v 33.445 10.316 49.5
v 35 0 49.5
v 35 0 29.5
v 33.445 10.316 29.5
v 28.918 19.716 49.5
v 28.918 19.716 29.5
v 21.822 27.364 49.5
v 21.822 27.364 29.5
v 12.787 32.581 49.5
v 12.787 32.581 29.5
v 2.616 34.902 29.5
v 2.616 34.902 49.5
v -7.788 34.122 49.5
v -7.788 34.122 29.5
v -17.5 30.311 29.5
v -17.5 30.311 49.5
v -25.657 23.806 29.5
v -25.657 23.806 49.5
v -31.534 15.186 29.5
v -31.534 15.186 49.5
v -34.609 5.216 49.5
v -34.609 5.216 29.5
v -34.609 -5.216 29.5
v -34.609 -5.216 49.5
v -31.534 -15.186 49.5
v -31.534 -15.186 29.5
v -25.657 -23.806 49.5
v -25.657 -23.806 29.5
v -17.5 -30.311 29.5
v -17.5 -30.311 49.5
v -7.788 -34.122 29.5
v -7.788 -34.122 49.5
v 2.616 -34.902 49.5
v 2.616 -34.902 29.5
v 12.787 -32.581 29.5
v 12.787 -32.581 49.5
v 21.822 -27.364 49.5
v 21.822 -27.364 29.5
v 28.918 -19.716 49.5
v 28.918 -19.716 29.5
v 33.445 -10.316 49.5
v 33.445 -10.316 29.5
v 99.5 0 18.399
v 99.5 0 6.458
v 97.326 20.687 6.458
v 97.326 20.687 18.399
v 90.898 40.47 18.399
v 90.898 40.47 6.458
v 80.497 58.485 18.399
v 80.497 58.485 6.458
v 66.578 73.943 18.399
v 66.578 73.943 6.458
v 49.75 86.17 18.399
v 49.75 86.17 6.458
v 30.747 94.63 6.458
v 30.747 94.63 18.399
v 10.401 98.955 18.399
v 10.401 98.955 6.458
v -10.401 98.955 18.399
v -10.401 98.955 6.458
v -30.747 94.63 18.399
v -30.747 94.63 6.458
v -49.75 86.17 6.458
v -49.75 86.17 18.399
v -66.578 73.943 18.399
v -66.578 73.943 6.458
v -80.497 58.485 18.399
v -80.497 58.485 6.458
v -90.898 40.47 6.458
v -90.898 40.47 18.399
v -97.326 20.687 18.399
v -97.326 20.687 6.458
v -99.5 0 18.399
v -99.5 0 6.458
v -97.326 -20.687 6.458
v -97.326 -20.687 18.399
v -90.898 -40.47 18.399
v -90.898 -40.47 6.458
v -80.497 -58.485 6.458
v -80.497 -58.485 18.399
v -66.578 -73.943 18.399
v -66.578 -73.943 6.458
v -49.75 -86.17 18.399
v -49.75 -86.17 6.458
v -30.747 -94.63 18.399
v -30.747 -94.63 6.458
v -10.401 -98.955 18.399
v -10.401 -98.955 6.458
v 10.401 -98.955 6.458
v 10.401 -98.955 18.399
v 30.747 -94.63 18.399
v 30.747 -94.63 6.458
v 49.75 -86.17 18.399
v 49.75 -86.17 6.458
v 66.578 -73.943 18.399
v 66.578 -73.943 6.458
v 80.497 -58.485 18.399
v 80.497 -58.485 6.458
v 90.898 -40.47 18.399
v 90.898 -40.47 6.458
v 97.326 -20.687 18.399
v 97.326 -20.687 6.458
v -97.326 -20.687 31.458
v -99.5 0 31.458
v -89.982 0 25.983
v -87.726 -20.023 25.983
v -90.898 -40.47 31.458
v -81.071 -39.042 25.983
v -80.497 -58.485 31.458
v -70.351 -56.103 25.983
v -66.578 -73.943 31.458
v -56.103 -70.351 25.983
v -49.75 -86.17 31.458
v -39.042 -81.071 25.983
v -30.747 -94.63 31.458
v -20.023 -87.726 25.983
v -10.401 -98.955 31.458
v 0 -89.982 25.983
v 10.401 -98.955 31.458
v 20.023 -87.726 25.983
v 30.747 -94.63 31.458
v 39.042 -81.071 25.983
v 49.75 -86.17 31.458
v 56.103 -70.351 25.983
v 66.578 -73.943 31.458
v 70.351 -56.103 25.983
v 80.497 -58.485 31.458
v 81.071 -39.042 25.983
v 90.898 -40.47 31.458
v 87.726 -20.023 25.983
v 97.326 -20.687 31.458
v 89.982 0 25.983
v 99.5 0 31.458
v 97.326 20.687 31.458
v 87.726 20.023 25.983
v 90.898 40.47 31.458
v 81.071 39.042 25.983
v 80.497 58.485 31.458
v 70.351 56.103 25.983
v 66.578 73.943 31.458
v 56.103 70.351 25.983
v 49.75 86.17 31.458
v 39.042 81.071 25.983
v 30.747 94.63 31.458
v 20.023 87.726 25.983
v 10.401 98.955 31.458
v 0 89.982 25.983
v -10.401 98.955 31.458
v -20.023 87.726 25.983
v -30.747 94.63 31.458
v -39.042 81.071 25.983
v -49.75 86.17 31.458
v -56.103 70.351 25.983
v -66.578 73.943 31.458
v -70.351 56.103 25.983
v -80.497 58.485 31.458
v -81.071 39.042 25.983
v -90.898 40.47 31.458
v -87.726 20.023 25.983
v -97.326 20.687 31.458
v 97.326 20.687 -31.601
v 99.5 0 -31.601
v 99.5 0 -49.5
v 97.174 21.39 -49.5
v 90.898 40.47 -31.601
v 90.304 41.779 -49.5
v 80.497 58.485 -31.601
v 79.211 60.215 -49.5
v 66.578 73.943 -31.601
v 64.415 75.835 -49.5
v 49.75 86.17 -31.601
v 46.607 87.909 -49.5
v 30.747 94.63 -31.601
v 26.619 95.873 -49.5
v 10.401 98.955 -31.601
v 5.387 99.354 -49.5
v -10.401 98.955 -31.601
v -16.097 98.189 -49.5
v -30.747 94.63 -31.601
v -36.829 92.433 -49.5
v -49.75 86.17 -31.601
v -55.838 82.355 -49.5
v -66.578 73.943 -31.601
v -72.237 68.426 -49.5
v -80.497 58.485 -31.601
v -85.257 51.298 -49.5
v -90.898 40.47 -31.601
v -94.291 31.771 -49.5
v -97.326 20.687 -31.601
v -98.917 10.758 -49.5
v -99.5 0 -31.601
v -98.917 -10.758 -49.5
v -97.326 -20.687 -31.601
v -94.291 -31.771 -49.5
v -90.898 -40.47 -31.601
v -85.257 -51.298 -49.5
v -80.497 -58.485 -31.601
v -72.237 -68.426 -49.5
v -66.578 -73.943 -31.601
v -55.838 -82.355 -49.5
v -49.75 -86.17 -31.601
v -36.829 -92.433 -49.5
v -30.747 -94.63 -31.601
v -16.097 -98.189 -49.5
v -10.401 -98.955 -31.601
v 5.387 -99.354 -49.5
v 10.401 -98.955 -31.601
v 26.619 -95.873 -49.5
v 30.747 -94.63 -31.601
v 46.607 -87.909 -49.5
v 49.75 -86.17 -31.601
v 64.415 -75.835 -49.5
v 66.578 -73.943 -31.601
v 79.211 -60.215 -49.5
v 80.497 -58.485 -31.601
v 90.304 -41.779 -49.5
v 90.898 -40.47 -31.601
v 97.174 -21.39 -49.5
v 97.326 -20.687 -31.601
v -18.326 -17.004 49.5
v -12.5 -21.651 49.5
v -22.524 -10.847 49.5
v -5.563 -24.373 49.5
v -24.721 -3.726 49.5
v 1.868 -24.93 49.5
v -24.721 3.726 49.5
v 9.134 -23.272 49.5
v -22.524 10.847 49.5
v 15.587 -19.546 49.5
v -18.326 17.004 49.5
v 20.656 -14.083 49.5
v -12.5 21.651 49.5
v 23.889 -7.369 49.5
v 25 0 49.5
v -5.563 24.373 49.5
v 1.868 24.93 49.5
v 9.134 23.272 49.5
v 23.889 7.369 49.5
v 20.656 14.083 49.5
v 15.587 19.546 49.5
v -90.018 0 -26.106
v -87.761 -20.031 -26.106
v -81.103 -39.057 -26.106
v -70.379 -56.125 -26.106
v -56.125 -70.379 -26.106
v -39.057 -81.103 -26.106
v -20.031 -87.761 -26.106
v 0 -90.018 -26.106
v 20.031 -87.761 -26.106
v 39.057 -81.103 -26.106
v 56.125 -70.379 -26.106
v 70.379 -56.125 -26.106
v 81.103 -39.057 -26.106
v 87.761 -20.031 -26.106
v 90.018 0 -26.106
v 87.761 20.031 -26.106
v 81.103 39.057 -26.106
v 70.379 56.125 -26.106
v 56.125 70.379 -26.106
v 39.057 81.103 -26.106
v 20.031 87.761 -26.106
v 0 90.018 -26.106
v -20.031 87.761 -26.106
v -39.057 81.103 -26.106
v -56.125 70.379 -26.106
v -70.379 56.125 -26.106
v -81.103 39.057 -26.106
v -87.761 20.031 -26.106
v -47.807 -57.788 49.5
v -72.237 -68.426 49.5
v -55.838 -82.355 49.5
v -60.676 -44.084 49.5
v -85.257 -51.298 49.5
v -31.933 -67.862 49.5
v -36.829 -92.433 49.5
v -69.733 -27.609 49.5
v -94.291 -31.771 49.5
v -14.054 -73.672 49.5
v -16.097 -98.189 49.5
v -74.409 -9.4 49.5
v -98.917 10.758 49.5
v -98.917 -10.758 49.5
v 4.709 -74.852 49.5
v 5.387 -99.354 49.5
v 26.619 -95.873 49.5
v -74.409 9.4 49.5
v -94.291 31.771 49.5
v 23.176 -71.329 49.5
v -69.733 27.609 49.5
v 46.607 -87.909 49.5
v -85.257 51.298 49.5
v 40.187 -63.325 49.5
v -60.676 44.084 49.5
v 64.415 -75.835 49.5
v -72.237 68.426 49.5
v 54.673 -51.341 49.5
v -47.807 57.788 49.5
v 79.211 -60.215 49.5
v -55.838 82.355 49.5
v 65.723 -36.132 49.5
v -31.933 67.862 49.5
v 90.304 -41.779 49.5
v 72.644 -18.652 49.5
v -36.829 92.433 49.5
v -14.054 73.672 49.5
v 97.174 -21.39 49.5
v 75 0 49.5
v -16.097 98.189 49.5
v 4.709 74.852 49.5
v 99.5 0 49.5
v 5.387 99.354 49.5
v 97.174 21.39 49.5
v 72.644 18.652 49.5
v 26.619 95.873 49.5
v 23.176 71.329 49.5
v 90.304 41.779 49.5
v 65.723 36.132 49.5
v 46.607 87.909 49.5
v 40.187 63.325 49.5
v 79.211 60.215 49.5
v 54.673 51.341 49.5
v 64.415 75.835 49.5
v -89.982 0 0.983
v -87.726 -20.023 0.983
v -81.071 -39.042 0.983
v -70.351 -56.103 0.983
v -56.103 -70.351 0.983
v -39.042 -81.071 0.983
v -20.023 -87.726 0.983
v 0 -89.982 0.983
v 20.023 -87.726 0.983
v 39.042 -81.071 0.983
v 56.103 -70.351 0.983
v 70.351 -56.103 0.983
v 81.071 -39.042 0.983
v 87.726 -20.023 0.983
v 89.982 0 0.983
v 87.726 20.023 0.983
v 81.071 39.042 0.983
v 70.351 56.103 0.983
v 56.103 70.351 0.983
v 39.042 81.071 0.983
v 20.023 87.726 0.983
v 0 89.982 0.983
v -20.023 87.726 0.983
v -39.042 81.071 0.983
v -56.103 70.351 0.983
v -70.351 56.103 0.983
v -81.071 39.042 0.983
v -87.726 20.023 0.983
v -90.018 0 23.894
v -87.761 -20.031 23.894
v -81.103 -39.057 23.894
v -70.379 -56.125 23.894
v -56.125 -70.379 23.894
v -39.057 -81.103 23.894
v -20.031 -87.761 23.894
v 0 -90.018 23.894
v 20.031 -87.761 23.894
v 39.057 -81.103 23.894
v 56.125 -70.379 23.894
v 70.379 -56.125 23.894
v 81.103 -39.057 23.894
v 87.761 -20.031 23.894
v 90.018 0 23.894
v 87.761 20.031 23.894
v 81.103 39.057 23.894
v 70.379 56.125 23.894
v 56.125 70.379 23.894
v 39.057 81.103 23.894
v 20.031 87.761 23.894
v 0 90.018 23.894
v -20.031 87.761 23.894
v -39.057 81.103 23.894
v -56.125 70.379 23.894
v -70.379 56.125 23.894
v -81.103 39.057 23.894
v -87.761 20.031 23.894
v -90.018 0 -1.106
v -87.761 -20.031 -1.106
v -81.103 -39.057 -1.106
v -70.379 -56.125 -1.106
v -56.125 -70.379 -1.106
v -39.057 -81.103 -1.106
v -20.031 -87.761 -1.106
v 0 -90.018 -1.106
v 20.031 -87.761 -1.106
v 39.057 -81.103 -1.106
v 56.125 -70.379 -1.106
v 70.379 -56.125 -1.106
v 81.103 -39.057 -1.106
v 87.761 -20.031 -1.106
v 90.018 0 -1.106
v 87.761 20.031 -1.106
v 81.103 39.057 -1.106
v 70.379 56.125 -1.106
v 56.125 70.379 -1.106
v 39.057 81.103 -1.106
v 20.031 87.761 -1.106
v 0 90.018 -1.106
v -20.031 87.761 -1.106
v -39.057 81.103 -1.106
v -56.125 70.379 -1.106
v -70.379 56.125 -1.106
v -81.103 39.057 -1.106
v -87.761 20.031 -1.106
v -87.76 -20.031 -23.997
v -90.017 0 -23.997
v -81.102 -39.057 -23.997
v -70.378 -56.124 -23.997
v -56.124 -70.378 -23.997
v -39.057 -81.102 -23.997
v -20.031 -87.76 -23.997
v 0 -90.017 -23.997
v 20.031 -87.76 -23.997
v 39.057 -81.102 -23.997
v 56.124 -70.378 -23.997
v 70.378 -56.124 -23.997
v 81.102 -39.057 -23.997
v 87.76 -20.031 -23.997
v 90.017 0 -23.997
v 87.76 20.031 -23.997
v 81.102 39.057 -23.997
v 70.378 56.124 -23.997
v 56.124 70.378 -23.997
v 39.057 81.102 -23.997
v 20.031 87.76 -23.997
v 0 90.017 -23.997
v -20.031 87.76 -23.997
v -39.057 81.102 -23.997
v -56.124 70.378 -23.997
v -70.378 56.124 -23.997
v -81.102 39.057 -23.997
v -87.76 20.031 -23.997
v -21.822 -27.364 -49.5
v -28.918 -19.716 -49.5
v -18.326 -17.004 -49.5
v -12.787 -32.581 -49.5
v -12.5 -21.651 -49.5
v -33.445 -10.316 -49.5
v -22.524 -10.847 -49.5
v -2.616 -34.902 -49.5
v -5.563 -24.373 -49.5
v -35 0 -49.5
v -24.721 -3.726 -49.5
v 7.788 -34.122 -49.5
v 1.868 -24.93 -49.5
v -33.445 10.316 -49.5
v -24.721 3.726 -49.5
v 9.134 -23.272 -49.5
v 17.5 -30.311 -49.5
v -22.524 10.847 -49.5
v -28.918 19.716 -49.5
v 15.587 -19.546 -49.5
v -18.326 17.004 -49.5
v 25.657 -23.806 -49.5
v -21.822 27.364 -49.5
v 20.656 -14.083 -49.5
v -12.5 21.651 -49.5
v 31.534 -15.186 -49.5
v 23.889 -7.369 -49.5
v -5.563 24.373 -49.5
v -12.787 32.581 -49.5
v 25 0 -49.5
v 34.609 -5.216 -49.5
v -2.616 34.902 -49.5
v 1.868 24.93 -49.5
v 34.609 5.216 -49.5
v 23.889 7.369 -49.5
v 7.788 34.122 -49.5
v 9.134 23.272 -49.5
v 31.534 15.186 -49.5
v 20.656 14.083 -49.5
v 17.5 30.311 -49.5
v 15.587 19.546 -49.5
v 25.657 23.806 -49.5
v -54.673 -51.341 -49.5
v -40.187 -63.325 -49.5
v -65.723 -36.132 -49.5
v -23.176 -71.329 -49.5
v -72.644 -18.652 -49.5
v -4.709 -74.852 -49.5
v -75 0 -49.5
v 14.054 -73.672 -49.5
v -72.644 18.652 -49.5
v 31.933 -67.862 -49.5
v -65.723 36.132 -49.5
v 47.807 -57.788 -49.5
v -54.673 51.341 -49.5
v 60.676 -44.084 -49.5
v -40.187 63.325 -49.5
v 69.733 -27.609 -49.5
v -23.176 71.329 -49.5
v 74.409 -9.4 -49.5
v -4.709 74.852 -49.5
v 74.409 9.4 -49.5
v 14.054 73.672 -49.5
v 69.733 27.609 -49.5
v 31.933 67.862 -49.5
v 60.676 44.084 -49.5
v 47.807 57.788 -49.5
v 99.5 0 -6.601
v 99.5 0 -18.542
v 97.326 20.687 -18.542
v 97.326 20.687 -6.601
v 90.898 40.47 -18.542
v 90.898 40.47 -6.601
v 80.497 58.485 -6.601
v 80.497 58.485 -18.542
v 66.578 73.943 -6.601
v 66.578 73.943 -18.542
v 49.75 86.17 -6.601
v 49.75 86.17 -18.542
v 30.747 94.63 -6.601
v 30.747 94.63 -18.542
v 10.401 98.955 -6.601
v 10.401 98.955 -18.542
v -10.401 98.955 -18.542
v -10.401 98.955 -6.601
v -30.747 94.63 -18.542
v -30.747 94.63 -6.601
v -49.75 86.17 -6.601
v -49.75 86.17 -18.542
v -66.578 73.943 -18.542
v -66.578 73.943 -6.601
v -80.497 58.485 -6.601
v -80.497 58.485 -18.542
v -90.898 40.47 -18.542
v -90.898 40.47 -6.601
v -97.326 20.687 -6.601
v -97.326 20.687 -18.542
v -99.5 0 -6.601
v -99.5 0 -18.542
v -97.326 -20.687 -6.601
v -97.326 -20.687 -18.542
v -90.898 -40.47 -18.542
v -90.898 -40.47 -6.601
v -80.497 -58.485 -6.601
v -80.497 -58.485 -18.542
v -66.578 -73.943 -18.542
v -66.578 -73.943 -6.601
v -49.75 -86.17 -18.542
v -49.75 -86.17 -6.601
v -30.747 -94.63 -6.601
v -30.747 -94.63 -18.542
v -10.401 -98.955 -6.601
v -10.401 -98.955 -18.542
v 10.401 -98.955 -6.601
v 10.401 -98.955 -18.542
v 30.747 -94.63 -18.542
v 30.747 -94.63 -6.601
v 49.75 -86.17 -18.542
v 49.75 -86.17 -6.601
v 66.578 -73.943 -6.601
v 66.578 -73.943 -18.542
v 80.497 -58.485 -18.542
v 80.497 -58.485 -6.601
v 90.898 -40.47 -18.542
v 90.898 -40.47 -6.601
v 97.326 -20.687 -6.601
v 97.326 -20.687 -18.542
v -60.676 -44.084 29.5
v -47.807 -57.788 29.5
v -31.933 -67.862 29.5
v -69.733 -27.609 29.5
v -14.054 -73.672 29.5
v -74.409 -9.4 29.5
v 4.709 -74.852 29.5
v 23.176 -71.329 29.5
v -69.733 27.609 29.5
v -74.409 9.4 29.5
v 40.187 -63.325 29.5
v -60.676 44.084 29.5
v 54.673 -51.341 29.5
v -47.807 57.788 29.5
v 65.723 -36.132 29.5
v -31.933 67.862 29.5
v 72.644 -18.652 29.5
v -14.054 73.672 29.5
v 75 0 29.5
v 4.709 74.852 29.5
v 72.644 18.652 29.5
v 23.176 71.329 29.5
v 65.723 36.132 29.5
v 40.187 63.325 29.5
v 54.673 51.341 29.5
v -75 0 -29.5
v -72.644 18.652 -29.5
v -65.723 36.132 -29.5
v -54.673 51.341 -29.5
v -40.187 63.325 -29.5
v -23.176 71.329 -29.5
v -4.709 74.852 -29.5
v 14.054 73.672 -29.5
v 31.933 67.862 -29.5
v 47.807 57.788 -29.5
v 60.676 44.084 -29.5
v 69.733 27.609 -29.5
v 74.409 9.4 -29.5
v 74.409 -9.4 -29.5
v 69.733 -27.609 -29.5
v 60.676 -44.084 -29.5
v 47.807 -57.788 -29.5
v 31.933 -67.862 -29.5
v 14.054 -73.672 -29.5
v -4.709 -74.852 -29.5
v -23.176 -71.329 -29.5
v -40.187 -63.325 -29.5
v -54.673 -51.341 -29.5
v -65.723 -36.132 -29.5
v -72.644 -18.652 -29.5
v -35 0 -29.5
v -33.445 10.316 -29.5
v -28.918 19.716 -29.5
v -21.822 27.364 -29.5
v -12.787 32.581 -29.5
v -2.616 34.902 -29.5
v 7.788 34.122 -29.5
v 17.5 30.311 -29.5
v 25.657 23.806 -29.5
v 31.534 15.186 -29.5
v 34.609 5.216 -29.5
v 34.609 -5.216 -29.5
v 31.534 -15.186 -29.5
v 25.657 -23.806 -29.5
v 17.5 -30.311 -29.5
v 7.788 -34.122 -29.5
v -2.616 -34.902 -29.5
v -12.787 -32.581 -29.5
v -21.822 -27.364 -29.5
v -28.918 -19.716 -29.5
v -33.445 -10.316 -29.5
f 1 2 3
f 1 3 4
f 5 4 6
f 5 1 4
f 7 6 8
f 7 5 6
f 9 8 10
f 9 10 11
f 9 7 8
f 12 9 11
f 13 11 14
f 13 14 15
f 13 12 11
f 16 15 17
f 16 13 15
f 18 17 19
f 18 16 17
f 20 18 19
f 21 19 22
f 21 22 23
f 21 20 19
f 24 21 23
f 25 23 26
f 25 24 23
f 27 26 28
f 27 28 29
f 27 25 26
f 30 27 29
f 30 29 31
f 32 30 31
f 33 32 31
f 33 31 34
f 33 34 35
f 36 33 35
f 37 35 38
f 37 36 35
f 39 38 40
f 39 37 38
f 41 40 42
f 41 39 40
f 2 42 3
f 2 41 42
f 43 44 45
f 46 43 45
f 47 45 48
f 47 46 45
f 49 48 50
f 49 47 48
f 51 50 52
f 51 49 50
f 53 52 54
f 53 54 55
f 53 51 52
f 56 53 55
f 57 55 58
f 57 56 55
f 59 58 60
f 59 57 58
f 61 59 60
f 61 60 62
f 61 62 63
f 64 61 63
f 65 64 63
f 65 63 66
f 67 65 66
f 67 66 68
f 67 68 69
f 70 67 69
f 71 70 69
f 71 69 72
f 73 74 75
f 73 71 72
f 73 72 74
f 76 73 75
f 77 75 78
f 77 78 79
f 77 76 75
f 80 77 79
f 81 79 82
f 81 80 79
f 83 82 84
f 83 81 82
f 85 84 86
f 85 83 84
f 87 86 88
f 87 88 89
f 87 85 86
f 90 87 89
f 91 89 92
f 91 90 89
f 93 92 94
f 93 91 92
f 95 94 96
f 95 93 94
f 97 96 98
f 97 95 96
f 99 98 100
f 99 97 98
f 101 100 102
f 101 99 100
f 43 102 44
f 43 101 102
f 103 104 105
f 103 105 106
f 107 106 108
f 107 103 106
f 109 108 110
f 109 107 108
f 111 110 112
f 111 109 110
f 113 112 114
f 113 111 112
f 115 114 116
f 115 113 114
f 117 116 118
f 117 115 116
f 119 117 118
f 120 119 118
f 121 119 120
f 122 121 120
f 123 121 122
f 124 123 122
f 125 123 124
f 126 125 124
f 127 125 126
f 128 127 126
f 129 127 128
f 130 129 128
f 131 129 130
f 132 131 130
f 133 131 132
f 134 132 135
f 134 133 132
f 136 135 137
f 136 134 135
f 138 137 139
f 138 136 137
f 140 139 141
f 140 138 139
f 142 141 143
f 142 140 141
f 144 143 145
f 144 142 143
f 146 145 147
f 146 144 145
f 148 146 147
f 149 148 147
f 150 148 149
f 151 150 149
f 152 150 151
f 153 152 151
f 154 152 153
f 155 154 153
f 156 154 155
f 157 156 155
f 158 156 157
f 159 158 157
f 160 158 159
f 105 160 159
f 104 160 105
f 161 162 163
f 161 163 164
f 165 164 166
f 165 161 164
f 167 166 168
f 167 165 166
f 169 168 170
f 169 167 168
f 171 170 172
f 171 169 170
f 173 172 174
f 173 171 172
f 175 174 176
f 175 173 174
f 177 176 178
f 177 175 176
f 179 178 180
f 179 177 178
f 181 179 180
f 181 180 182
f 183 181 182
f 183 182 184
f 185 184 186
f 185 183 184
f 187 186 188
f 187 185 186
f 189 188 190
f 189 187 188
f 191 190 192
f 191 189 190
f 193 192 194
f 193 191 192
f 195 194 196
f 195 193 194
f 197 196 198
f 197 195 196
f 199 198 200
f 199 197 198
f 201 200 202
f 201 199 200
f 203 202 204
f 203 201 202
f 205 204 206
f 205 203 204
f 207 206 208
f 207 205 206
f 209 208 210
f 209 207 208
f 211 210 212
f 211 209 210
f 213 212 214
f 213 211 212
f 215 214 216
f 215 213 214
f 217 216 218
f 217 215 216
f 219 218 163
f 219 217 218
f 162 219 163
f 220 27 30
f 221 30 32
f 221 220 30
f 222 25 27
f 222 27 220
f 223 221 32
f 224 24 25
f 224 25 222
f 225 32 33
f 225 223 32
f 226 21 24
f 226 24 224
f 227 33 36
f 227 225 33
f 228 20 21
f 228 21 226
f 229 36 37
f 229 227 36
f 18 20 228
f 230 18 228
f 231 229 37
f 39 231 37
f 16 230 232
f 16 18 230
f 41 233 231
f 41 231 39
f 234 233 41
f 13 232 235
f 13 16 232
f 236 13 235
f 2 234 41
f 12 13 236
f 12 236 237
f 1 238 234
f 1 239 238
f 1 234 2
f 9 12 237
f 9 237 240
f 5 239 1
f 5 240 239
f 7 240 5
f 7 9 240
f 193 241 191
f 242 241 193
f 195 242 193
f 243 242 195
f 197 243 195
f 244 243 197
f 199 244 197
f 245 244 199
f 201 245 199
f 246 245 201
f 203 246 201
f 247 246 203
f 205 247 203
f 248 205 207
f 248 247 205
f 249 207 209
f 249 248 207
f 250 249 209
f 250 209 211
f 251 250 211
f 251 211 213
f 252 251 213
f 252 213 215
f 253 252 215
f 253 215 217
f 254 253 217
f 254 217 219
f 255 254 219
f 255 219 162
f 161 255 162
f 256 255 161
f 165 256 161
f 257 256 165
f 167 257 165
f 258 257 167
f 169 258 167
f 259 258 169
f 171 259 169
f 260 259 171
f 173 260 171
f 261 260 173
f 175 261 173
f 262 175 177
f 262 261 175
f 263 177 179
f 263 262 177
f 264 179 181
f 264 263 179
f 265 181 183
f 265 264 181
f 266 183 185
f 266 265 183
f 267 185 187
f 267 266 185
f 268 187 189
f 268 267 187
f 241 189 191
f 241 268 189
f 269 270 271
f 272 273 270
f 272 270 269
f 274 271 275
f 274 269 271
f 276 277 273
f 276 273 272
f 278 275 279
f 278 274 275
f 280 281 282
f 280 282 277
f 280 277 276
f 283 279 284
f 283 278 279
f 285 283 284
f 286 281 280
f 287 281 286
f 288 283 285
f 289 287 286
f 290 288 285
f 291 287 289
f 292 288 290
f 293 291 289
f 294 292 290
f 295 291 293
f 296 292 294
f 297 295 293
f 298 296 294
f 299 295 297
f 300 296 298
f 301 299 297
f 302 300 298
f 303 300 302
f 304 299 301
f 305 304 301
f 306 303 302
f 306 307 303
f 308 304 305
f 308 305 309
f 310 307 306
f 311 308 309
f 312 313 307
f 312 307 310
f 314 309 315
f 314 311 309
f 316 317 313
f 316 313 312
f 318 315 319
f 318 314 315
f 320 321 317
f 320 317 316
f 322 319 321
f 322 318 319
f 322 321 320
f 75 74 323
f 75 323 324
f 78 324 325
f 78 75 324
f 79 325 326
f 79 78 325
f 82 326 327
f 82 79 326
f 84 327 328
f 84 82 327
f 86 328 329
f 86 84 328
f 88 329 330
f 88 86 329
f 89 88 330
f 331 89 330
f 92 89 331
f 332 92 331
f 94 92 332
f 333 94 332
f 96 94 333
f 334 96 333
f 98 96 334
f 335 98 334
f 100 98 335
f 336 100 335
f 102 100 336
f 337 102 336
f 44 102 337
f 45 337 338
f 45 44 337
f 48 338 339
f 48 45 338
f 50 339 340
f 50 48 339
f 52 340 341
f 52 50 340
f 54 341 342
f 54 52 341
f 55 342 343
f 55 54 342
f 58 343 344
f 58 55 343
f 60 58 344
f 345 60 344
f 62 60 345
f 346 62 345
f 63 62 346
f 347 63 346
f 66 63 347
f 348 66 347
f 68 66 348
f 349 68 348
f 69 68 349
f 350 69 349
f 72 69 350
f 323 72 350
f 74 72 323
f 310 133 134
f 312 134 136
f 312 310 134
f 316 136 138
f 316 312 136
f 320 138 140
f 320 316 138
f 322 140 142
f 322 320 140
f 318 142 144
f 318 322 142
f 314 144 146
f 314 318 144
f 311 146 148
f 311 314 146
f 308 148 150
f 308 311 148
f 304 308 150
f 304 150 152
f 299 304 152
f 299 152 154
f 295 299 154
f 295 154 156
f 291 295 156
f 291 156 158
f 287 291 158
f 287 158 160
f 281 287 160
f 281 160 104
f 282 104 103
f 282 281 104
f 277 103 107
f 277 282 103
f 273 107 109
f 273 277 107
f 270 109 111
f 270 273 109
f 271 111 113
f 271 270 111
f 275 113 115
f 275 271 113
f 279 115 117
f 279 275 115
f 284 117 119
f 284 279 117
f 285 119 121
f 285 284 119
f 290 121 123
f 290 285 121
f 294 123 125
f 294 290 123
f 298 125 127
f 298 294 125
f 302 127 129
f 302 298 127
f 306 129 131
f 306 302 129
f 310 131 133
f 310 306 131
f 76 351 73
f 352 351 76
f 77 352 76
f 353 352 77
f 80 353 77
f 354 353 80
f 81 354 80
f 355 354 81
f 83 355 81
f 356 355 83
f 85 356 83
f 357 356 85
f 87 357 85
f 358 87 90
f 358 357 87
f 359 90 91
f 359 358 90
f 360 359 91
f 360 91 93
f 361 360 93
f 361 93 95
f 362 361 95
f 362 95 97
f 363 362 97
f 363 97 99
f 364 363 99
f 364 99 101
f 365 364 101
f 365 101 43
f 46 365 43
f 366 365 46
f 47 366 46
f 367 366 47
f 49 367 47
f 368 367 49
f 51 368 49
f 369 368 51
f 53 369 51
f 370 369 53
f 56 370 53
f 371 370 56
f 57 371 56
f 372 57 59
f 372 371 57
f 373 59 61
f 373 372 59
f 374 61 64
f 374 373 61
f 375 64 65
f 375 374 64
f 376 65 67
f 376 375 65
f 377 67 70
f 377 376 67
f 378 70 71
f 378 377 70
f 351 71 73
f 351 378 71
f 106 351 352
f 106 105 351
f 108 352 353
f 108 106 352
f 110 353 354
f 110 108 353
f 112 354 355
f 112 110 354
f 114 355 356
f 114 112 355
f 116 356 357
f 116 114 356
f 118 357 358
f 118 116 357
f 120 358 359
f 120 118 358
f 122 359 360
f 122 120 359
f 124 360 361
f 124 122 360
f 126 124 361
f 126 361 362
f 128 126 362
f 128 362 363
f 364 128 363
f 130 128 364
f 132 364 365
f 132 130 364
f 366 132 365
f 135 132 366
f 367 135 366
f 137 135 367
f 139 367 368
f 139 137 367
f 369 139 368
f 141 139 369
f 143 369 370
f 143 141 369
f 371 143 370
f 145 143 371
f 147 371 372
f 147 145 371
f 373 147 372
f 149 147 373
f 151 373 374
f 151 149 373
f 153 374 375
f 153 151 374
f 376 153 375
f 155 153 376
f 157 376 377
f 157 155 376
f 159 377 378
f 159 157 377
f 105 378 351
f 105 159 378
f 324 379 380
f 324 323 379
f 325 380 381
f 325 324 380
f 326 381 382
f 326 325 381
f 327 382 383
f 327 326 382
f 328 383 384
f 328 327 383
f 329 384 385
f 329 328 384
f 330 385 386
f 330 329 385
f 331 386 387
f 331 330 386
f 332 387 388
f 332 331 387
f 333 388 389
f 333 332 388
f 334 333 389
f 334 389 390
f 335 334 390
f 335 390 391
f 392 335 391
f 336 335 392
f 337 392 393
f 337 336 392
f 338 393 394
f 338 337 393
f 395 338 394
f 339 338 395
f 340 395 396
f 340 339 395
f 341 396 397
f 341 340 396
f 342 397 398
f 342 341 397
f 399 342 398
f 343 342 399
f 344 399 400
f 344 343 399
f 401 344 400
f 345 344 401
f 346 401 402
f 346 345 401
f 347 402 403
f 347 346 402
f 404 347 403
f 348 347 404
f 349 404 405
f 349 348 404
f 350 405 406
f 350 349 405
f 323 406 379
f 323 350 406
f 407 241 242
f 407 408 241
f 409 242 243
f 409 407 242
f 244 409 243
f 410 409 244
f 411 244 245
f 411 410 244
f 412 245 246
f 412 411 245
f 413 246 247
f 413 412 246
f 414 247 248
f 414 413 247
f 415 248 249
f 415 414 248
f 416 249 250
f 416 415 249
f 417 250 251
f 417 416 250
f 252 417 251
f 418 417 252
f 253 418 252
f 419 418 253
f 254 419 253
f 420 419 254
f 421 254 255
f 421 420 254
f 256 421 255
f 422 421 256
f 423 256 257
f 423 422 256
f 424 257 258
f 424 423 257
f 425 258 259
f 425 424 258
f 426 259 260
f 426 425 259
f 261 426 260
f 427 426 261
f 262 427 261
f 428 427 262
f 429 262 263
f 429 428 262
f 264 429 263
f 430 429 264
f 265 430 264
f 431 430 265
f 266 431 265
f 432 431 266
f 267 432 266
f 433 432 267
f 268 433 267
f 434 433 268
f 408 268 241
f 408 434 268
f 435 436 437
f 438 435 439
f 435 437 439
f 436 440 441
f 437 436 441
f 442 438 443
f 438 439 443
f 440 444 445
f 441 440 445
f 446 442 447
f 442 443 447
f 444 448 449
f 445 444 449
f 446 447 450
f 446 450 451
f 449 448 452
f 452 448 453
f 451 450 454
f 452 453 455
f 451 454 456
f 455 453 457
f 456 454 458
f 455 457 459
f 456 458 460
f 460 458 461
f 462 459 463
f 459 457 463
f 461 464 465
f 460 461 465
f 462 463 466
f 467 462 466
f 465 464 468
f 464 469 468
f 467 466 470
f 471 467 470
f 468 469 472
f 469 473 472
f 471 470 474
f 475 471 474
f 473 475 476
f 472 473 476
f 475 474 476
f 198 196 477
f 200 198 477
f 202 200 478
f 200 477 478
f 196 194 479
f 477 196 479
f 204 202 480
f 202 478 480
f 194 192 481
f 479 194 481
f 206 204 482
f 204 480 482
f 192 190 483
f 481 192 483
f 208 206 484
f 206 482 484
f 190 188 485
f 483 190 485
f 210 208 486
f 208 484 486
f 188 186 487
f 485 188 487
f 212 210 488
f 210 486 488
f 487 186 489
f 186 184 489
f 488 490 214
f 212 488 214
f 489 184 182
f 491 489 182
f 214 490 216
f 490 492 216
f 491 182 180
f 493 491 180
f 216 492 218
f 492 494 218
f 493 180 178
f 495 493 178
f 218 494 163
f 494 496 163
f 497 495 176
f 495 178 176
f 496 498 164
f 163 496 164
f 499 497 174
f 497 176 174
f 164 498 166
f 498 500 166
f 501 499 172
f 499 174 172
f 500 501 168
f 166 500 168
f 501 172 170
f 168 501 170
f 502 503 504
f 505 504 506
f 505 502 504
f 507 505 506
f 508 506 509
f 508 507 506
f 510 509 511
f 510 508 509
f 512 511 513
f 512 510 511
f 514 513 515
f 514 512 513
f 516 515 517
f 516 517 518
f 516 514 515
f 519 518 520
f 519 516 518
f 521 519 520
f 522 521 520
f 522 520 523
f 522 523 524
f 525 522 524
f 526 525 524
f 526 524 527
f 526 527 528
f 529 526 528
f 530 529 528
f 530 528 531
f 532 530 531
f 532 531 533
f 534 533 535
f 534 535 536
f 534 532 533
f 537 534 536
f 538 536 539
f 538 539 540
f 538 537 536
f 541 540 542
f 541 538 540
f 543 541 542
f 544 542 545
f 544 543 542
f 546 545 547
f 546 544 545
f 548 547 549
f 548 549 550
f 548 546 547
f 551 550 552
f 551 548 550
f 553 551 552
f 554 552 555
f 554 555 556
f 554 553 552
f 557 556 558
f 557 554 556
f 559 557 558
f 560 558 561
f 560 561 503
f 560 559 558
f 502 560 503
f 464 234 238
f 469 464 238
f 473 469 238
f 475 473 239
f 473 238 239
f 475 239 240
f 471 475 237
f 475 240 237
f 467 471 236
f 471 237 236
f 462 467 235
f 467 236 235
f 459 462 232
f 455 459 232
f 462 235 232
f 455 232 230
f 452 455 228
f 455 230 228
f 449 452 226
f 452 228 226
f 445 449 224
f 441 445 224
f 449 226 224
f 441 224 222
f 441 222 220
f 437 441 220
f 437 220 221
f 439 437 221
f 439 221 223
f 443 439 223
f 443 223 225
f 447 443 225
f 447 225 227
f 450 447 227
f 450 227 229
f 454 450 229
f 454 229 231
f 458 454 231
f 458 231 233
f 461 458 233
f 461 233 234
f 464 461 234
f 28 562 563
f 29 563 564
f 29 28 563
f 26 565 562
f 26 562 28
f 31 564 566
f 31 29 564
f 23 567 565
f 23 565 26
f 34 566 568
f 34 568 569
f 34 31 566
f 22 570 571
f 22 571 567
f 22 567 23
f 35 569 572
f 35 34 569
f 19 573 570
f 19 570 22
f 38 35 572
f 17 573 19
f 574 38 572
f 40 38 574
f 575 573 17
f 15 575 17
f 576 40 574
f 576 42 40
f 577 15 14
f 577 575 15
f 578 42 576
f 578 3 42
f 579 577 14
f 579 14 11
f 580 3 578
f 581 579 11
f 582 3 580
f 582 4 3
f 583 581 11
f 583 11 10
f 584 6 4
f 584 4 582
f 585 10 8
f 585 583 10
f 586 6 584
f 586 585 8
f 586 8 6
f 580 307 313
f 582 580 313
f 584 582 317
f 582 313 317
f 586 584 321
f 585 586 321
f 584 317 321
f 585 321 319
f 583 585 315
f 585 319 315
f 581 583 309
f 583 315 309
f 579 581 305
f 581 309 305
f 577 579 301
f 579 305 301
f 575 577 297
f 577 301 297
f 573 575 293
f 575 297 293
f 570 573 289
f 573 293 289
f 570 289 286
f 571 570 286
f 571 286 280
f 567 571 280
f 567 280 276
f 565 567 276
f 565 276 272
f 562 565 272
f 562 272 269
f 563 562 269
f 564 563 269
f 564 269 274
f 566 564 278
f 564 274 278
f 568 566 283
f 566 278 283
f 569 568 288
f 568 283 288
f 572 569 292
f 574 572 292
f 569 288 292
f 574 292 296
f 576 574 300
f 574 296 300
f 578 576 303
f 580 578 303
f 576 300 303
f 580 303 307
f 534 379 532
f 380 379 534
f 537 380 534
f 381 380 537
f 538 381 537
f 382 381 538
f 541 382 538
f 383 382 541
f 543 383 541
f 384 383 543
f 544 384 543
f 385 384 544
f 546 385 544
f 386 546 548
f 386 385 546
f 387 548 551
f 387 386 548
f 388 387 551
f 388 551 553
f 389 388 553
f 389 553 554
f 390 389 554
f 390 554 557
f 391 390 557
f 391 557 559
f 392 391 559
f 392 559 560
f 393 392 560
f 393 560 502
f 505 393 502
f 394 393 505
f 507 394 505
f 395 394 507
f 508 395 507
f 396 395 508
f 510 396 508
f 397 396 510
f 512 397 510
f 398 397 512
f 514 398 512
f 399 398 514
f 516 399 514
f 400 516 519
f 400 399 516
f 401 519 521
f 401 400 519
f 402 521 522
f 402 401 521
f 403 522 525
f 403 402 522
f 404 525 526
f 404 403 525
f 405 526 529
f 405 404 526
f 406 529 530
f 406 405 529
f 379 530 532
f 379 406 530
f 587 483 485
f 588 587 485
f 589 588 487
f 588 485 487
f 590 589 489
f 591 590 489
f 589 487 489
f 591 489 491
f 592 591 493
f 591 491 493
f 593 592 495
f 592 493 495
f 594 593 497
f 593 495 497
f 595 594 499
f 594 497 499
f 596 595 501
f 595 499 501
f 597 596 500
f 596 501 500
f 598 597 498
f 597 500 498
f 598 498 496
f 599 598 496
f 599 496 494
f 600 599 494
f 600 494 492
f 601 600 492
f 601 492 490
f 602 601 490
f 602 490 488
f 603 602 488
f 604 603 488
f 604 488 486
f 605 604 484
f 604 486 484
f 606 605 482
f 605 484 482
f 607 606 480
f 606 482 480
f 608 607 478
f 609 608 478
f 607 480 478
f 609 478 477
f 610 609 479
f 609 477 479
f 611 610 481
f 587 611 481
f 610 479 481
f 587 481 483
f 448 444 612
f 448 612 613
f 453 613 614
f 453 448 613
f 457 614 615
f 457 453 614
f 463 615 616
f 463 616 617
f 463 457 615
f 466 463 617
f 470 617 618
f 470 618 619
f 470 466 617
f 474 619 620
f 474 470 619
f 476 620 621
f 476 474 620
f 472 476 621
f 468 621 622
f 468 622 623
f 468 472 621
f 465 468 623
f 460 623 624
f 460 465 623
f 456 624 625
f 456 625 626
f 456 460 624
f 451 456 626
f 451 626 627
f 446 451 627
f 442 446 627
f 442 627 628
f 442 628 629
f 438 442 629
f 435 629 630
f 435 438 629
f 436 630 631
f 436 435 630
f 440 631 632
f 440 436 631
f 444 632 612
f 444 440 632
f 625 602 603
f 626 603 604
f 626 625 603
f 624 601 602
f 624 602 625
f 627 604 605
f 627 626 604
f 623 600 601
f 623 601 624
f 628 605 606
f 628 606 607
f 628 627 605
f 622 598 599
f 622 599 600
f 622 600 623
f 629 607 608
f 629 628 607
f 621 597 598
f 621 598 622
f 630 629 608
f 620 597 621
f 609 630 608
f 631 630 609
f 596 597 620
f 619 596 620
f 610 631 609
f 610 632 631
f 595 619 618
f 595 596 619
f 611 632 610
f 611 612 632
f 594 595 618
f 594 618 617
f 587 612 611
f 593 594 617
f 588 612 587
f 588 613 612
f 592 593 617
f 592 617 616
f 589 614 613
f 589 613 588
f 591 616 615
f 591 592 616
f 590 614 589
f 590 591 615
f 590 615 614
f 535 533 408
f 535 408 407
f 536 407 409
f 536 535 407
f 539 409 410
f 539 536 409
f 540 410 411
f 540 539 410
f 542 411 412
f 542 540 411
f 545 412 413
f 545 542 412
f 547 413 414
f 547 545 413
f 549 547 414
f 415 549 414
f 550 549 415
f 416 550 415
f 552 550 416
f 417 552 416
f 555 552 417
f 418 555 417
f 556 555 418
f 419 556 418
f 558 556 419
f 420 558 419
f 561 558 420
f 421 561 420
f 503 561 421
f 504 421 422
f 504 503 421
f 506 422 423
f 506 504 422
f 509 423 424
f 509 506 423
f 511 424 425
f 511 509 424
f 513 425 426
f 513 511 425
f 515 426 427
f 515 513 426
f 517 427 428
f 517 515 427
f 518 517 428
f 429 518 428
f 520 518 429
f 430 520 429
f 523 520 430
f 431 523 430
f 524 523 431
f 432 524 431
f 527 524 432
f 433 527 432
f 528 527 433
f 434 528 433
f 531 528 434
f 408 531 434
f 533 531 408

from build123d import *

# Parameters (mm, degrees)
SKETCH1_R               = 99.5
BOSS_EXTRUDE1_DEPTH     = 49.5
SKETCH3_R               = 75
SKETCH3_R_2             = 35
CUT_EXTRUDE1_DEPTH      = 20
SKETCH4_R               = 25
CUT_EXTRUDE2_DEPTH      = 1.0000001
CUT_EXTRUDE2_DEPTH_BACK = 100.0000001
SKETCH5_R               = 75
SKETCH5_R_2             = 35
CUT_EXTRUDE3_DEPTH      = 20


with BuildPart() as part:
    # Sketch1 → Boss-Extrude1 (new body, symmetric)
    with BuildSketch(Plane.XY):
        Circle(SKETCH1_R)
    extrude(amount=BOSS_EXTRUDE1_DEPTH, both=True)

    # Sketch2 → Cut-Revolve1 (revolve, cut)
    with BuildSketch(Plane(origin=(0, 0, 0), x_dir=(1, 0, 0), z_dir=(0, 1, 0))):
        Polygon((-89.981945933, -25.982850646), (-99.911722122, -31.694962561), (-99.915568006, -18.158689934), (-90.018054068, -23.893839429), align=None)
        Polygon((-89.981945933, -0.982850646), (-99.911722122, -6.694962562), (-99.92977619, 6.849543049), (-90.018054068, 1.106160571), align=None)
        Polygon((-90.016592149, 23.99721909), (-99.911722122, 18.305037438), (-99.92977619, 31.849543049), (-90.018054068, 26.106160571), align=None)
    revolve(axis=Axis((0, 0, 0), (0, 0, 1)), mode=Mode.SUBTRACT)

    # Sketch3 → Cut-Extrude1 (cut)
    with BuildSketch(Plane(origin=(0, 0, -49.5), x_dir=(-1, 0, 0), z_dir=(0, 0, -1))):
        Circle(SKETCH3_R)
        Circle(SKETCH3_R_2, mode=Mode.SUBTRACT)
    extrude(amount=-CUT_EXTRUDE1_DEPTH, mode=Mode.SUBTRACT)

    # Sketch4 → Cut-Extrude2 (cut, two sides)
    with BuildSketch(Plane.XY.offset(49.5)) as cut_extrude2_sk:
        Circle(SKETCH4_R)
    extrude(amount=CUT_EXTRUDE2_DEPTH, mode=Mode.SUBTRACT)
    extrude(cut_extrude2_sk.sketch, amount=-CUT_EXTRUDE2_DEPTH_BACK, mode=Mode.SUBTRACT)

    # Sketch5 → Cut-Extrude3 (cut)
    with BuildSketch(Plane.XY.offset(49.5)):
        Circle(SKETCH5_R)
        Circle(SKETCH5_R_2, mode=Mode.SUBTRACT)
    extrude(amount=-CUT_EXTRUDE3_DEPTH, mode=Mode.SUBTRACT)


solid = part.part
